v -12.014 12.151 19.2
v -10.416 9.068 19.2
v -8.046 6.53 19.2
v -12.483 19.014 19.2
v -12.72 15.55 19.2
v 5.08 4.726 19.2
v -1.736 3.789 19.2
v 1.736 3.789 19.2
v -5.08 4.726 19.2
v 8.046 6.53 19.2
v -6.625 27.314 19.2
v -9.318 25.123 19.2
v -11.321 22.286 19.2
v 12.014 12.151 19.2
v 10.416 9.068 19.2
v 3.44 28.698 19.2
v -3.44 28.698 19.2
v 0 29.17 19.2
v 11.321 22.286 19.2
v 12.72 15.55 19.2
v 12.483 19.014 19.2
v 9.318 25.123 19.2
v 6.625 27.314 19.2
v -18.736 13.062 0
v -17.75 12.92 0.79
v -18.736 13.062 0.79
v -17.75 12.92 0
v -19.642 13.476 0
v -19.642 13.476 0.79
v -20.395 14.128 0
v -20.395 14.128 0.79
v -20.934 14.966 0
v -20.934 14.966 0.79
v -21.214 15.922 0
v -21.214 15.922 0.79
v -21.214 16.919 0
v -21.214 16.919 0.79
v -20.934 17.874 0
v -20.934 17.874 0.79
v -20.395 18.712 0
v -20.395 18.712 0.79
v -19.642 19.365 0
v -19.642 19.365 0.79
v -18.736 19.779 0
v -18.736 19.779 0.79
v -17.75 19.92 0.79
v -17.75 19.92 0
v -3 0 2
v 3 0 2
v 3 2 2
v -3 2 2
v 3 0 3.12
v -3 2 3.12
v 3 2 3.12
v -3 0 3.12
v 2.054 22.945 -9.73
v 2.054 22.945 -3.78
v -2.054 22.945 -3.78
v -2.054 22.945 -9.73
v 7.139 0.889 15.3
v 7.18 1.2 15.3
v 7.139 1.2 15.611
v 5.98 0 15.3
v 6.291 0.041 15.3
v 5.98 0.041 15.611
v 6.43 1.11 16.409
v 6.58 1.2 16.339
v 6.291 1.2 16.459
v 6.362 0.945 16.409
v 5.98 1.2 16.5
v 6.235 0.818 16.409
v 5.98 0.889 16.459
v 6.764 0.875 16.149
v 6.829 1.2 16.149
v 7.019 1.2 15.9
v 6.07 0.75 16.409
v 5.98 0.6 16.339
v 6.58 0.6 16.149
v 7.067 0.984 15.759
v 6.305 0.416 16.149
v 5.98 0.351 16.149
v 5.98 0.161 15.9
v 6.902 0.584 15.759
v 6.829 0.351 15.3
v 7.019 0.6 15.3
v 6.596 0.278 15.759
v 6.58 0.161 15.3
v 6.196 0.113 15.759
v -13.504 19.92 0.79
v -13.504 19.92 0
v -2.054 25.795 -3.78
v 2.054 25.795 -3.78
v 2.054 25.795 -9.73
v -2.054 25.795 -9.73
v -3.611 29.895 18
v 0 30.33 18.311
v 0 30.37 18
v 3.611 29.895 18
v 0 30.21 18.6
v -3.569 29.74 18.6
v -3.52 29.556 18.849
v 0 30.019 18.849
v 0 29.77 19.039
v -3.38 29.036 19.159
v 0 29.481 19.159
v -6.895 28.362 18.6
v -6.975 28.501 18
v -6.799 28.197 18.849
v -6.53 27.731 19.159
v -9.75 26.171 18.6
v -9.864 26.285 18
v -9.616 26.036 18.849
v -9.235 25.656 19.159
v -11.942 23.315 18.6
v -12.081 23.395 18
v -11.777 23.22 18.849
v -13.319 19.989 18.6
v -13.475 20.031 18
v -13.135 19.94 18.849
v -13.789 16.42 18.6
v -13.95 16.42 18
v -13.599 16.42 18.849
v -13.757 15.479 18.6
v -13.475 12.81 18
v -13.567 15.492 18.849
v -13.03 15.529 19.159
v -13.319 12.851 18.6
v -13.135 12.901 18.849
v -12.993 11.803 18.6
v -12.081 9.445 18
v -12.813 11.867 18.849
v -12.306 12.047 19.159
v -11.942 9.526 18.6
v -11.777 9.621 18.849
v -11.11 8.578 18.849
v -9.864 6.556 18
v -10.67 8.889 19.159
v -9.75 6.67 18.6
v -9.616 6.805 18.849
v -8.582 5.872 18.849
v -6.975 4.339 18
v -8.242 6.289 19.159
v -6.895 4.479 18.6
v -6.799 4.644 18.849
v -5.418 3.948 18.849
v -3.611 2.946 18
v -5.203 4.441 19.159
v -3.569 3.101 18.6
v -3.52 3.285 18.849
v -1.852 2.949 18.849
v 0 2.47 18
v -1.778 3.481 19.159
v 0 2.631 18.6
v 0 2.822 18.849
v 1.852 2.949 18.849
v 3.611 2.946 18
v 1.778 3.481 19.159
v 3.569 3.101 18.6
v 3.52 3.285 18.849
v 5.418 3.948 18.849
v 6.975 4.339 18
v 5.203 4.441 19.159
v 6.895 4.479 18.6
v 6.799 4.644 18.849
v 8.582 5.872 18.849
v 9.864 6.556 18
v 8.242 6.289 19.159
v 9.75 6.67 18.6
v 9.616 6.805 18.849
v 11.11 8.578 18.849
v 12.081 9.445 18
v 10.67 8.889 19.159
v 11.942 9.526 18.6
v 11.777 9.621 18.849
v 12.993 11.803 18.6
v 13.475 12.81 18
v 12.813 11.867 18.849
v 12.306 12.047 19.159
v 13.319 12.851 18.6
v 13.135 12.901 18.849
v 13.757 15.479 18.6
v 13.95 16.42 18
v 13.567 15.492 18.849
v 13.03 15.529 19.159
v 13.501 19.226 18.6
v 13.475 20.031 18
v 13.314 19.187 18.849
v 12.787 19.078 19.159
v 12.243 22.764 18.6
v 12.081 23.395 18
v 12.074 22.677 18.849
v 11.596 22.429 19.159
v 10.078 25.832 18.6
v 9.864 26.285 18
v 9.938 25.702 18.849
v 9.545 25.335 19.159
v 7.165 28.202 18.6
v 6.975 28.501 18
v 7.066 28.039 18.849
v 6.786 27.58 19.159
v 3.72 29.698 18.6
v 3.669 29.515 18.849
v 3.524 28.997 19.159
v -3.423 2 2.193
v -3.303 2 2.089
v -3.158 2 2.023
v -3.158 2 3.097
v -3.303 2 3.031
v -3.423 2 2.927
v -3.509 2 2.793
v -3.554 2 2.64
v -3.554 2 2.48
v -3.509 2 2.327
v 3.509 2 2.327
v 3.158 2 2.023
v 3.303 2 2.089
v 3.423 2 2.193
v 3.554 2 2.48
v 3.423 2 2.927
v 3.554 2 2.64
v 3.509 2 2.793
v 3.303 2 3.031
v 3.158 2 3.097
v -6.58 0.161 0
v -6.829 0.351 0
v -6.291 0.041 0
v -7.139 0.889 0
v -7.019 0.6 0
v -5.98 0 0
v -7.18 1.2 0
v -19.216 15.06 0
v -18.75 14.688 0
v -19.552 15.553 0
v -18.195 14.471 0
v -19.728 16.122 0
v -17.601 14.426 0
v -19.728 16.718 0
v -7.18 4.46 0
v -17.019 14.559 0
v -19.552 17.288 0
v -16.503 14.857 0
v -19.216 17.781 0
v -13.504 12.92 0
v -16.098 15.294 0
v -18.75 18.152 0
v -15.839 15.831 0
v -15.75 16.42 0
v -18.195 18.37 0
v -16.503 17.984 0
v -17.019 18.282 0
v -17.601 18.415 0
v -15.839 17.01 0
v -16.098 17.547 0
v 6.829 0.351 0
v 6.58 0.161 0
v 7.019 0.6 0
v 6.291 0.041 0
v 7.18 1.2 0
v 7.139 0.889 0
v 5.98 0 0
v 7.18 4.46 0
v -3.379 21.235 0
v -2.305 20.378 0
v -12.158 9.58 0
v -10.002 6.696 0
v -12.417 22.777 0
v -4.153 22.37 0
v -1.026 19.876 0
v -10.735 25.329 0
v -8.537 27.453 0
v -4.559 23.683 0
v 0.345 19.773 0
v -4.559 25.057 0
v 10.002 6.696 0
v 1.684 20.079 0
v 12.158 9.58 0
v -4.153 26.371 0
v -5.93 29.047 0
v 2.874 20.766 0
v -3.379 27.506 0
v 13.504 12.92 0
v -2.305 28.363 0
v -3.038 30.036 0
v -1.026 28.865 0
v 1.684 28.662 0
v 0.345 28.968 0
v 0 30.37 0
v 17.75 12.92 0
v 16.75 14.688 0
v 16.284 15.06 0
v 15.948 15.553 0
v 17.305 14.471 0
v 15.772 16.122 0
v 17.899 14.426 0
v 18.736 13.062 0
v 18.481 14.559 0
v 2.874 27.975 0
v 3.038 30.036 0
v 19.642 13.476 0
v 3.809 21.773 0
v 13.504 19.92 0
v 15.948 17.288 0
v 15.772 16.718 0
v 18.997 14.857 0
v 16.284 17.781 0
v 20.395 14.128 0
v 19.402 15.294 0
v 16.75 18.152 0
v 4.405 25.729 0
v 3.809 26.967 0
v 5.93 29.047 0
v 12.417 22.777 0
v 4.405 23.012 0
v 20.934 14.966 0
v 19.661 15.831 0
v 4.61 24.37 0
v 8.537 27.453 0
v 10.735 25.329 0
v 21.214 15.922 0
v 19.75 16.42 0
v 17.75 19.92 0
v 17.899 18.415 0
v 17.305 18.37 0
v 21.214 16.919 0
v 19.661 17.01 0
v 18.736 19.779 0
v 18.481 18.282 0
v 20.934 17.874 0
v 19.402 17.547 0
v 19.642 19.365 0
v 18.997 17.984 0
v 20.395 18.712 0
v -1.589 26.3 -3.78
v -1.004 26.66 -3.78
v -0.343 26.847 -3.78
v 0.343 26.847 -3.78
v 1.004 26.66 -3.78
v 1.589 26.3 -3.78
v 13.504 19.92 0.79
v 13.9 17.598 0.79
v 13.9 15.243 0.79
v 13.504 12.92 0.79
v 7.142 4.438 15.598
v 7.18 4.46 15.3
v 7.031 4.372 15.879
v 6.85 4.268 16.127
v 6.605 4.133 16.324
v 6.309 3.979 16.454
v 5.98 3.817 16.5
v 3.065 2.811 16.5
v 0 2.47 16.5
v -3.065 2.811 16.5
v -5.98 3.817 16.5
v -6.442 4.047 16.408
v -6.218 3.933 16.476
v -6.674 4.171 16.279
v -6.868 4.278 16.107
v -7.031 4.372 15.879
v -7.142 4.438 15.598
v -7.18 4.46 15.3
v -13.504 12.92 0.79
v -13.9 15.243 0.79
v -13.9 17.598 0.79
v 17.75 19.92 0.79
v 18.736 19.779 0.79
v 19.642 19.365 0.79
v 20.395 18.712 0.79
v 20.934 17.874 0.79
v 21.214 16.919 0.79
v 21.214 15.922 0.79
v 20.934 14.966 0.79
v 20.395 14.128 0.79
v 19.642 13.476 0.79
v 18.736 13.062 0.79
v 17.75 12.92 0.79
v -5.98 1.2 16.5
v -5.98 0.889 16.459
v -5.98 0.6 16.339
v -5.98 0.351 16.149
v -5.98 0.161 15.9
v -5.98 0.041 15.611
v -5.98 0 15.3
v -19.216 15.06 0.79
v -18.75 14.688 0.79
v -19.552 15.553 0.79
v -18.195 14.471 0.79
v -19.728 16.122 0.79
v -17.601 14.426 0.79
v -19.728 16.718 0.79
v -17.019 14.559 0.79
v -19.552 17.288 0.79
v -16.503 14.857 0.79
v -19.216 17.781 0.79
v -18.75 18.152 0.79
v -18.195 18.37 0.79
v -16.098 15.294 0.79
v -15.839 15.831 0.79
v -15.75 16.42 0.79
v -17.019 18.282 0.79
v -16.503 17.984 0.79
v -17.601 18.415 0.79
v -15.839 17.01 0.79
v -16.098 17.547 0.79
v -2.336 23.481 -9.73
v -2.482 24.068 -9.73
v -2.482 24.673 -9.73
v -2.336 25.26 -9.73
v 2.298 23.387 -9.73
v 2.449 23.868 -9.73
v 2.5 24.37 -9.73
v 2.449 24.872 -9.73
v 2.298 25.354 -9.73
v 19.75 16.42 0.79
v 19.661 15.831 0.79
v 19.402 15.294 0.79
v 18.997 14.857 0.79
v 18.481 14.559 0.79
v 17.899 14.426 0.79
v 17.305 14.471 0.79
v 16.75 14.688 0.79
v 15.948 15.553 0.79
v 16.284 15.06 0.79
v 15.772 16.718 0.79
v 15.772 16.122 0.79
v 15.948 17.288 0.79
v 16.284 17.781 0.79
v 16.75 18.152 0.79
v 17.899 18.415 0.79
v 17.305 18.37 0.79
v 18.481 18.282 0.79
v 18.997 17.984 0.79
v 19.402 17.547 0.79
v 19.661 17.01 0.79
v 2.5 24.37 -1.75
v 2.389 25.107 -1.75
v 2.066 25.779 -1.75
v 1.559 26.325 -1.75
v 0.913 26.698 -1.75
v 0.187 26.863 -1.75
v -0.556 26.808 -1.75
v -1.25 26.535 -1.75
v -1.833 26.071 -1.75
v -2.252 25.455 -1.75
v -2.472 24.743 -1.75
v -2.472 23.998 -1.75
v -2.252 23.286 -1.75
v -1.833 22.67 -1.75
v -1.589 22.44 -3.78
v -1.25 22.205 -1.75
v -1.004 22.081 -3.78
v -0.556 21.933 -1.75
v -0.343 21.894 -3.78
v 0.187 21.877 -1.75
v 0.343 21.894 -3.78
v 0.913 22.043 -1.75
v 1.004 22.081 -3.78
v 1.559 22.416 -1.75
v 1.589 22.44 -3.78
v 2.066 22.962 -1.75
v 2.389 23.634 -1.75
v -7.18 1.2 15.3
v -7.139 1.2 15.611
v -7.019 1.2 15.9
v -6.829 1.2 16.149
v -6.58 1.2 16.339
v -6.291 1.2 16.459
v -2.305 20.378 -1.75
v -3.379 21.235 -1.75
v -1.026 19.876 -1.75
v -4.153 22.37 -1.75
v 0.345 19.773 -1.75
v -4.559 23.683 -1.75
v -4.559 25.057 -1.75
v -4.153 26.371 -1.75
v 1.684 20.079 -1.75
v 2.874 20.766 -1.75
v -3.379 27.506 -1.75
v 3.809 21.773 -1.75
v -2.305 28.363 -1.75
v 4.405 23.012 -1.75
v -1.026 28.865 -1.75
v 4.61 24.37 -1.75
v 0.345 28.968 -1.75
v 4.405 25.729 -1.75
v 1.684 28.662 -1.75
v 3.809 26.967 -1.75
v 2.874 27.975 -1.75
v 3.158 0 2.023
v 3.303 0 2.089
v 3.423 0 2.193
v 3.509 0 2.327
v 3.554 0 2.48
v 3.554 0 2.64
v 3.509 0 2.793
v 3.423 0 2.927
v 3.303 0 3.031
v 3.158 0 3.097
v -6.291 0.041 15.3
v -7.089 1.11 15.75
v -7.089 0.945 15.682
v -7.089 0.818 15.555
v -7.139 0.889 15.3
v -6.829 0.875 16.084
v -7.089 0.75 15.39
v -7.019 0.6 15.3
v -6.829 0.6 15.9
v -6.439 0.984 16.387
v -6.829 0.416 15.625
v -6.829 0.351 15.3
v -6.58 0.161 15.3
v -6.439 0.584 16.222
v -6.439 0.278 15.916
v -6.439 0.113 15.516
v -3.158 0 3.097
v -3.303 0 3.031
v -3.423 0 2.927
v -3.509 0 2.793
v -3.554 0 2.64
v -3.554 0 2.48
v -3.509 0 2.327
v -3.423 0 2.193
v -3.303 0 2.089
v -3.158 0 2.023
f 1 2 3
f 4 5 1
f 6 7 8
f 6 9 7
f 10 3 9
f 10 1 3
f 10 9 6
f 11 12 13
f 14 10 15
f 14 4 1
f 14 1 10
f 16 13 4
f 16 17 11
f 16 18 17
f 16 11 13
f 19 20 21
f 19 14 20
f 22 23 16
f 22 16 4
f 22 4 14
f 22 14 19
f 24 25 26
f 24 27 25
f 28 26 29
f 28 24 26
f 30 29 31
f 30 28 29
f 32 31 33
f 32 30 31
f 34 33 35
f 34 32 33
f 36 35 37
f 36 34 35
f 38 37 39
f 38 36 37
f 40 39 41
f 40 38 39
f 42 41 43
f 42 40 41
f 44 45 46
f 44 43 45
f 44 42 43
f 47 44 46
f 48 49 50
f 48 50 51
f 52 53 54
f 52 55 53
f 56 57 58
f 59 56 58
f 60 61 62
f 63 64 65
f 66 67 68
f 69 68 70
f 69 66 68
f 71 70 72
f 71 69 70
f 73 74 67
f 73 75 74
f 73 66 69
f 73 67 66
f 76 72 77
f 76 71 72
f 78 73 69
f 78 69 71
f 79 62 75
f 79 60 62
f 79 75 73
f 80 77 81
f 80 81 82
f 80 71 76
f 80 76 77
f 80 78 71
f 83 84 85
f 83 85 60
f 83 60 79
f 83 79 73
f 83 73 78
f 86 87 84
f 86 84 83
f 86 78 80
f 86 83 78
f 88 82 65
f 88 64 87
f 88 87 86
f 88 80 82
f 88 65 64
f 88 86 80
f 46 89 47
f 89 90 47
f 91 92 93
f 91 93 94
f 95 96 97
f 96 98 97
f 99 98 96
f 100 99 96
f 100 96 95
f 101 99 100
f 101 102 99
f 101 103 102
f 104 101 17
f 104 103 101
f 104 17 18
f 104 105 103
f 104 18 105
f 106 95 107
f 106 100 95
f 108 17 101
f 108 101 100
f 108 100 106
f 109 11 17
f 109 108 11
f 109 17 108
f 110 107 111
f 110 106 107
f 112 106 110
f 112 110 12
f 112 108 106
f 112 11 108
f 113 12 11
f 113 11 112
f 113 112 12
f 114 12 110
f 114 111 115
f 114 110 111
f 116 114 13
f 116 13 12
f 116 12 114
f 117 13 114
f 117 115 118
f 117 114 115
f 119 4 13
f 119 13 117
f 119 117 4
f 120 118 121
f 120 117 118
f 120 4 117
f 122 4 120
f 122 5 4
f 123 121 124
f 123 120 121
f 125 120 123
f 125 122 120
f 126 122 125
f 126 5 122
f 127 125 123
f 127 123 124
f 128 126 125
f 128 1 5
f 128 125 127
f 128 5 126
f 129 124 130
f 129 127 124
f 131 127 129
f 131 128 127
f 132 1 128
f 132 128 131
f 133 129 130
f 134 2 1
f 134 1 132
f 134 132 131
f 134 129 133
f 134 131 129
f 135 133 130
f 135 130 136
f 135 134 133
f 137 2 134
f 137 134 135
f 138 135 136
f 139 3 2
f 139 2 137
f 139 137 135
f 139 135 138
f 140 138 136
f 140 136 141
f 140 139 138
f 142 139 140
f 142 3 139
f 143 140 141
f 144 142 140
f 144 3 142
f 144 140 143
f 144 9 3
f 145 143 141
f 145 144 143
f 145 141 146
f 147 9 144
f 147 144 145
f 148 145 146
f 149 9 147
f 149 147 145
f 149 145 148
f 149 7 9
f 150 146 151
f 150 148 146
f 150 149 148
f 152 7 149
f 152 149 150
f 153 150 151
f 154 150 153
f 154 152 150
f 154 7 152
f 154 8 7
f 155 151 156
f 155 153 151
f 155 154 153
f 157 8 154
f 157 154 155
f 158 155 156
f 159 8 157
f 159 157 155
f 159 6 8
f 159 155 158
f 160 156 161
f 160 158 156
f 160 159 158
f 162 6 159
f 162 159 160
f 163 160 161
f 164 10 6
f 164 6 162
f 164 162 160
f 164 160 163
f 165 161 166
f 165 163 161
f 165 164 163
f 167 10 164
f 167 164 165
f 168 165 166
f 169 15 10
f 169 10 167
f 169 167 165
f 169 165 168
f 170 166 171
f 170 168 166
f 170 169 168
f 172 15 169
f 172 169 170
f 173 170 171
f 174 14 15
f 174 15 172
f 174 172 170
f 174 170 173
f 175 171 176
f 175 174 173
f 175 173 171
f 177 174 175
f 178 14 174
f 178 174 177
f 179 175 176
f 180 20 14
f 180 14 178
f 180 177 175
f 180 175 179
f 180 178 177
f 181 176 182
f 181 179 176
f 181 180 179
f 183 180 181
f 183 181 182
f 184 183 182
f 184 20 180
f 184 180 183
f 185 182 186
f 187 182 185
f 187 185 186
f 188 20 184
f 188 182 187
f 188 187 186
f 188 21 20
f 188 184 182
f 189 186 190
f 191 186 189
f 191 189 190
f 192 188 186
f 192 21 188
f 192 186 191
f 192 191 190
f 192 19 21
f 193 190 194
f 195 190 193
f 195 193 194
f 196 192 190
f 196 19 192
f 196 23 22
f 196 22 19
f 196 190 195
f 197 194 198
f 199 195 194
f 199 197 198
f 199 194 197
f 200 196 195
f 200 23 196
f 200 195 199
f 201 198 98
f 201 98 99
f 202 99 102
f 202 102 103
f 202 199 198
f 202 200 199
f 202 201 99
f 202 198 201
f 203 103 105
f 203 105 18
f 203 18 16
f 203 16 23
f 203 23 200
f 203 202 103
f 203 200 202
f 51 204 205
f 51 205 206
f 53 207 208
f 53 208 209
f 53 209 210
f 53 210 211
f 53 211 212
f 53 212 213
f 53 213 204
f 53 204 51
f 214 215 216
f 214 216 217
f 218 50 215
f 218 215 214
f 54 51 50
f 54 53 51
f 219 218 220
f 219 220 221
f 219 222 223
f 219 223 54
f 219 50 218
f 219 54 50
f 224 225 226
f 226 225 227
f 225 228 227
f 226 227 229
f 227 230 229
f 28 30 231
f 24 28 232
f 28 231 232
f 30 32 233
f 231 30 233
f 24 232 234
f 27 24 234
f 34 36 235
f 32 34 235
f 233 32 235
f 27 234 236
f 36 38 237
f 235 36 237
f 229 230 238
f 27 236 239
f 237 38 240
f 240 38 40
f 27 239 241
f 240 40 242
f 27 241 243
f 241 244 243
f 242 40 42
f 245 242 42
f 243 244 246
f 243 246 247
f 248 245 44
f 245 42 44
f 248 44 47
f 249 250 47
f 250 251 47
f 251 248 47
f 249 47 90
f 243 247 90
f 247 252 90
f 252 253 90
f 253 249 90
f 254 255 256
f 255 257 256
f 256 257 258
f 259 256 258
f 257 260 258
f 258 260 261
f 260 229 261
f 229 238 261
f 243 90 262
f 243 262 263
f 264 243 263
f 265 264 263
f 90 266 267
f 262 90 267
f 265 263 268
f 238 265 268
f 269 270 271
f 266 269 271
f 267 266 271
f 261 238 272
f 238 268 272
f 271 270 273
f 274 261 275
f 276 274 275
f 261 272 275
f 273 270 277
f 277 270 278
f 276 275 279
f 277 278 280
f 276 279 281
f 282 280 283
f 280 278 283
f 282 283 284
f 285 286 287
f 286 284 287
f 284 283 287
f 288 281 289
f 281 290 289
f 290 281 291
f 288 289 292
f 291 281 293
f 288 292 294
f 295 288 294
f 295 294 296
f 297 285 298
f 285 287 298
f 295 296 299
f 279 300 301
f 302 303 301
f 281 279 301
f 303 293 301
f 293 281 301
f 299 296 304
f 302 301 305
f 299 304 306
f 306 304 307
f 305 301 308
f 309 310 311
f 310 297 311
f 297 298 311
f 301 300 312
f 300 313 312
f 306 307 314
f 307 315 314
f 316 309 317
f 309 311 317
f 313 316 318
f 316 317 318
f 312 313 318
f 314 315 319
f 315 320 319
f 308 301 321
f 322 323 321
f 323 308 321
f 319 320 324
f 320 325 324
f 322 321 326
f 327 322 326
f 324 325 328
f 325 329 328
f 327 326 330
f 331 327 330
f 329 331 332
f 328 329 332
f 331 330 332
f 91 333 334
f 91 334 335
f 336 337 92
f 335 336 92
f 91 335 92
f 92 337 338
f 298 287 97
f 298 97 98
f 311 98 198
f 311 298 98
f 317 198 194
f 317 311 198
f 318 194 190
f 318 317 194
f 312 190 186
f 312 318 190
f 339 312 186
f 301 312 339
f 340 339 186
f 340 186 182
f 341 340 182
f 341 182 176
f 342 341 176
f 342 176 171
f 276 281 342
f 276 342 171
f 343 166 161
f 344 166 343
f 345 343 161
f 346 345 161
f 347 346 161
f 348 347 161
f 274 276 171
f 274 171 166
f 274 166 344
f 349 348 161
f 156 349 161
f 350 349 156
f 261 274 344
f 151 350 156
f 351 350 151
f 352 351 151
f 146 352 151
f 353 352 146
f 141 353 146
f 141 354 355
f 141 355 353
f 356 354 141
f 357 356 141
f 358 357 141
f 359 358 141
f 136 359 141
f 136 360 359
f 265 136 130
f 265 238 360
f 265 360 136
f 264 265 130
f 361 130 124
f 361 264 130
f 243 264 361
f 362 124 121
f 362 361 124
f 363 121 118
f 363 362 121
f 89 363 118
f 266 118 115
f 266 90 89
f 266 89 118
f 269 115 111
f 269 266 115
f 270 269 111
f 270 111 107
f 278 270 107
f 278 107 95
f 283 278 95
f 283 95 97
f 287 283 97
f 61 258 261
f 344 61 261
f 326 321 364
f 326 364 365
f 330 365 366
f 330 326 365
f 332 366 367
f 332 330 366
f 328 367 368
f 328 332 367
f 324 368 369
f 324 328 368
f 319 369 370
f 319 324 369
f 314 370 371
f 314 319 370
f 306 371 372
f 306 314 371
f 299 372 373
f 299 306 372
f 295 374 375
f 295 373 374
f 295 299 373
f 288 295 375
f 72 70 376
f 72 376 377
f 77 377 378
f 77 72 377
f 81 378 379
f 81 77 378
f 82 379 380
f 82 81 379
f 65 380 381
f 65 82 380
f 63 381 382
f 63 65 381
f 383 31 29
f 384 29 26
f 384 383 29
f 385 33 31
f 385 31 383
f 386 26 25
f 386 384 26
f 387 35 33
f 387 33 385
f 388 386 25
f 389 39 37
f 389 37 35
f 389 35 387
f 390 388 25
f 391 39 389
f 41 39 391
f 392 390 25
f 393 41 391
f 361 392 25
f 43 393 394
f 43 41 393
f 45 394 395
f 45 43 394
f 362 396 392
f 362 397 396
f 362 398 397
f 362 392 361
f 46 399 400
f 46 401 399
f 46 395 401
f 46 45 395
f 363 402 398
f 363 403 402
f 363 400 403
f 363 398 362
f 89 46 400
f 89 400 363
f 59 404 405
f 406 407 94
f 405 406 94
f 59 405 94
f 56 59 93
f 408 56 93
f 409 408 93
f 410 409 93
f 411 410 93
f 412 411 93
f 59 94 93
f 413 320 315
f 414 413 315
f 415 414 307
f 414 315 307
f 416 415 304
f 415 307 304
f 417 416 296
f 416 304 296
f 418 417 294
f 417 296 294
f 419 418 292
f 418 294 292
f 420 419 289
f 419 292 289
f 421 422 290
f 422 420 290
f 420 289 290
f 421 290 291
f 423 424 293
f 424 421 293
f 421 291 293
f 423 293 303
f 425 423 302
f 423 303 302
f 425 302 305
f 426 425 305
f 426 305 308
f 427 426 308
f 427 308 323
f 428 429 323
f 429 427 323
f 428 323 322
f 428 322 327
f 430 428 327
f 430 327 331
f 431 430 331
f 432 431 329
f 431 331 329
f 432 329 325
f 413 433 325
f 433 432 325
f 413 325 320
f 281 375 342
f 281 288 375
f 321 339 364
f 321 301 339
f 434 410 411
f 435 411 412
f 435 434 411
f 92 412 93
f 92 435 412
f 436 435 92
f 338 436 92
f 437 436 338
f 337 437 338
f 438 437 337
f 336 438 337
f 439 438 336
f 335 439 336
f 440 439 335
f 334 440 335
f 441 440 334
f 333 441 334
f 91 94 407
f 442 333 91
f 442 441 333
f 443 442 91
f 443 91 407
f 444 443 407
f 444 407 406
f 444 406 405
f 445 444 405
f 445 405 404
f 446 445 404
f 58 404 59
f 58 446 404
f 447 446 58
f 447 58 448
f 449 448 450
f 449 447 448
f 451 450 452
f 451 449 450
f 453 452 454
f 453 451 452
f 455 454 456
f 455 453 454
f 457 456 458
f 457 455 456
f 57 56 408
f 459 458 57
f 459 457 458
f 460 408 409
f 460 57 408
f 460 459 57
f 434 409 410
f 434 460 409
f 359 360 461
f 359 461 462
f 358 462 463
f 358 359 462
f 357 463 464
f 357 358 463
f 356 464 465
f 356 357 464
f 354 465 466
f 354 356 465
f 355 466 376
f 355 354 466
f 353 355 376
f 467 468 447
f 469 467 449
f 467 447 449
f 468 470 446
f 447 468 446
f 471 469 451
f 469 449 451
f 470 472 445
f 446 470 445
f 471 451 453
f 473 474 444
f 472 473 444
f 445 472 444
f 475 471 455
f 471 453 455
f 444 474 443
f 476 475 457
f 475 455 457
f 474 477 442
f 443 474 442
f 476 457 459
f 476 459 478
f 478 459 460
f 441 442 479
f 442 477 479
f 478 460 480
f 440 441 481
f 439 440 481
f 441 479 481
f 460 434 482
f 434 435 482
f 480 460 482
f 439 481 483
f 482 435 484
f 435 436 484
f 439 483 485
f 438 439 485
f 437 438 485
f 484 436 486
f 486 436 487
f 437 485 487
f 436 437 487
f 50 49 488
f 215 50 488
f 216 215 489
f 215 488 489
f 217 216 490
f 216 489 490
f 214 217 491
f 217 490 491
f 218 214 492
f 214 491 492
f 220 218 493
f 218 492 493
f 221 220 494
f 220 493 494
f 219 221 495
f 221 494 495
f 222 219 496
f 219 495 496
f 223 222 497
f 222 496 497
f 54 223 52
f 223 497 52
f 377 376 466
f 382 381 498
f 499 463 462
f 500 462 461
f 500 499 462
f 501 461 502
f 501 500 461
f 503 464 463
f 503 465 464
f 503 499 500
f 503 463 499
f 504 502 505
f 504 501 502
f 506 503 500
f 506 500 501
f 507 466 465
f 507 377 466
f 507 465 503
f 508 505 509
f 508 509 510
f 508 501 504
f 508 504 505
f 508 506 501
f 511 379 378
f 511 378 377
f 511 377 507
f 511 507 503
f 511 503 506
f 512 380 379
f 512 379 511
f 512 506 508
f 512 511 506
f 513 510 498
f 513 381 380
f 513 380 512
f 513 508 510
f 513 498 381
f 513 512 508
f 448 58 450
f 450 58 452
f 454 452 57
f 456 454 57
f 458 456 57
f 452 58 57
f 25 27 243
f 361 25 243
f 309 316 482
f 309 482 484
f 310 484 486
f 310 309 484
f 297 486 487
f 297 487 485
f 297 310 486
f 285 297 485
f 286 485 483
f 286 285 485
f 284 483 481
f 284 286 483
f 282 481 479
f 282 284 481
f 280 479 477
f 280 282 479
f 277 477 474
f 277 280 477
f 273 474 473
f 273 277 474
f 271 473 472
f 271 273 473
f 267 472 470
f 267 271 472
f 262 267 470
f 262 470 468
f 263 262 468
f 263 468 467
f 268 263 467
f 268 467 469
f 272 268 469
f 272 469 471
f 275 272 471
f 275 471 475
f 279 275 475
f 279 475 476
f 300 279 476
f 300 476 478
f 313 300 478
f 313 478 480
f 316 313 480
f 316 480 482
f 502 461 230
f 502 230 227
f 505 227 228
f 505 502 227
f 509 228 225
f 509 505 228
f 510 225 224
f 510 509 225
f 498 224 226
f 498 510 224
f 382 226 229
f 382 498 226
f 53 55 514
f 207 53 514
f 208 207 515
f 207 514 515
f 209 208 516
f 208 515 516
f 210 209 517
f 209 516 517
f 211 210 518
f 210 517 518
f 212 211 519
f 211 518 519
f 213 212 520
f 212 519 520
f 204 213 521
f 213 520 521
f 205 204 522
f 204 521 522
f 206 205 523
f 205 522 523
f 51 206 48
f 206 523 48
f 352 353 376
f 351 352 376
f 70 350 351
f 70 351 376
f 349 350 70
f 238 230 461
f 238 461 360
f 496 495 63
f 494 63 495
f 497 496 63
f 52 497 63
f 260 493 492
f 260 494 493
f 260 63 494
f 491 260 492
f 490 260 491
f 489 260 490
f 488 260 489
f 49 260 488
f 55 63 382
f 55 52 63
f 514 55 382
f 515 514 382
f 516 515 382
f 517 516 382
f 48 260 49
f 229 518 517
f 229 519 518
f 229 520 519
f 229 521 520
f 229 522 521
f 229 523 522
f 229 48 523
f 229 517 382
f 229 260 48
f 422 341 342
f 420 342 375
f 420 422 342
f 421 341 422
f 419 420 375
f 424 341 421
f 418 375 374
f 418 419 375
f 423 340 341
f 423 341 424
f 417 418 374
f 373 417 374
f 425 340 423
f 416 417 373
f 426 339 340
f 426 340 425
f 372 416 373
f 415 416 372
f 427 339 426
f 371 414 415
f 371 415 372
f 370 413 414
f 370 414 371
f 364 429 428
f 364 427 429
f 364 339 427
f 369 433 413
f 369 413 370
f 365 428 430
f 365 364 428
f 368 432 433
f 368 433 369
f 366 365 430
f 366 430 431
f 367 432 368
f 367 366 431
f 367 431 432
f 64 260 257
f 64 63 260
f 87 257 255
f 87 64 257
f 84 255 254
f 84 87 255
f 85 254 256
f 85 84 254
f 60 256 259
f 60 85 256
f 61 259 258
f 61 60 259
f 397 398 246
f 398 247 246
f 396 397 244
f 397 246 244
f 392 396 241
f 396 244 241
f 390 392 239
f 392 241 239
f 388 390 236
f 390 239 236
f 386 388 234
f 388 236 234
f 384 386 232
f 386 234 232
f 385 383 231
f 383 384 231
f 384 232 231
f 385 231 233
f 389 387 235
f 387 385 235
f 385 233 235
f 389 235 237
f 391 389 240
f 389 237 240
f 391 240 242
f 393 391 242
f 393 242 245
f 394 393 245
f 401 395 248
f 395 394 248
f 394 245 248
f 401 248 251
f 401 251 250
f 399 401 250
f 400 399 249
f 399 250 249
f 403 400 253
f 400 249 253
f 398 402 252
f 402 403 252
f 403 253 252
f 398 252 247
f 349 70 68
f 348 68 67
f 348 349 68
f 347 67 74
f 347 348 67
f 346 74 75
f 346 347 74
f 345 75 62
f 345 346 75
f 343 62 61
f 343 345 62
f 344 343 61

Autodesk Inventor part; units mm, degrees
ref_plane "YZ Plane" through (0, 0, 0) normal (1, 0, 0) x (0, 1, 0)
ref_plane "XZ Plane" through (0, 0, 0) normal (0, 1, 0) x (-1, 0, 0)
ref_plane "XY Plane" through (0, 0, 0) normal (0, 0, 1) x (1, 0, 0)
sketch "Sketch1" plane through (0, 0, 0) normal (0, 0, 1) x (1, 0, 0)
  line L0 (0, 0) -> (0, 30.3704) construction
  line L1 (0, 0) -> (7.18, 0)
  line L2 (7.18, 0) -> (7.18, 4.46)
  arc A0 (0, 2.4704) -> (0, 30.3704) centre (0, 16.4204) ccw
  line L3 (13.5038, 19.9204) -> (17.75, 19.9204)
  arc A1 (17.75, 12.9204) -> (17.75, 19.9204) centre (17.75, 16.4204) ccw
  line L4 (17.75, 12.9204) -> (13.5038, 12.9204)
  circle A2 centre (17.75, 16.4204) radius 2
  line L5 (0, 0) -> (-7.18, 0)
  line L6 (-7.18, 0) -> (-7.18, 4.46)
  arc A3 (0, 30.3704) -> (0, 2.4704) centre (0, 16.4204) ccw
  line L7 (-13.5038, 19.9204) -> (-17.75, 19.9204)
  arc A4 (-17.75, 19.9204) -> (-17.75, 12.9204) centre (-17.75, 16.4204) ccw
  line L8 (-17.75, 12.9204) -> (-13.5038, 12.9204)
  circle A5 centre (-17.75, 16.4204) radius 2
  circle A6 centre (0, 24.3704) radius 4.61
  circle A7 centre (0, 24.3704) radius 2.5
  line L9 (2.0541, 25.7954) -> (-2.0541, 25.7954)
  line L10 (2.0541, 22.9454) -> (-2.0541, 22.9454)
  dimension "d0" = 13.95
  dimension "d1" = 7.18
  dimension "d2" = 4.46
  dimension "d3" = 3.5
  dimension "d4" = 4
  dimension "d11" = 9.22
  dimension "d12" = 5
  dimension "d13" = 2.85
  dimension "d26" = 35.5
  dimension "d27" = 6
extrude "Extrusion1" add sketch "Sketch1" along normal blind 19.2 contours A0 A3 | A6 | A7 L10 L9 | L9 A7 | A7 L10
extrude "Extrusion2" add sketch "Sketch1" along normal blind 0.79 contours A0 L3 A1 L4 | L8 A4 L7 A3
extrude "Extrusion3" add sketch "Sketch1" along normal blind 16.5 contours L5 L6 A3 A0 L2 L1
extrude "Extrusion4" add sketch "Sketch1" against normal blind 1.75 contours A6
extrude "Extrusion5" add sketch "Sketch1" against normal blind 3.78 contours L9 A7 | A7 L10
extrude "Extrusion6" add sketch "Sketch1" against normal blind 9.73 contours A7 L10 L9
fillet "Fillet1" radius 1.2 6 edges at (7.18, 28.3807, 19.2) (7.18, 0, 8.25) (0, 0, 16.5) (-7.18, 0, 8.25) (-7.18, 2.23, 16.5) (7.18, 2.23, 16.5)
sketch "Sketch2" plane through (-5.98, 0, 0) normal (0, -1, 0) x (1, 0, 0)
  line L0 (8.98, 2.56) -> (2.98, 2.56) construction
  line L1 (8.98, 2) -> (2.98, 2)
  line L2 (2.98, 3.12) -> (8.98, 3.12)
  arc A0 (8.98, 2) -> (8.98, 3.12) centre (8.98, 2.56) ccw
  arc A1 (2.98, 3.12) -> (2.98, 2) centre (2.98, 2.56) ccw
  line L3 (0, 0) -> (11.96, 0) projected
  point P0 (5.98, 0)
  point P1 (5.98, 2.56)
  point P2 (5.98, 0)
  dimension "d21" = 2
  dimension "d22" = 1.12
  dimension "d23" = 6
extrude "Extrusion7" cut sketch "Sketch2" against normal blind 2
properties part number "STEPPER MOTOR"
